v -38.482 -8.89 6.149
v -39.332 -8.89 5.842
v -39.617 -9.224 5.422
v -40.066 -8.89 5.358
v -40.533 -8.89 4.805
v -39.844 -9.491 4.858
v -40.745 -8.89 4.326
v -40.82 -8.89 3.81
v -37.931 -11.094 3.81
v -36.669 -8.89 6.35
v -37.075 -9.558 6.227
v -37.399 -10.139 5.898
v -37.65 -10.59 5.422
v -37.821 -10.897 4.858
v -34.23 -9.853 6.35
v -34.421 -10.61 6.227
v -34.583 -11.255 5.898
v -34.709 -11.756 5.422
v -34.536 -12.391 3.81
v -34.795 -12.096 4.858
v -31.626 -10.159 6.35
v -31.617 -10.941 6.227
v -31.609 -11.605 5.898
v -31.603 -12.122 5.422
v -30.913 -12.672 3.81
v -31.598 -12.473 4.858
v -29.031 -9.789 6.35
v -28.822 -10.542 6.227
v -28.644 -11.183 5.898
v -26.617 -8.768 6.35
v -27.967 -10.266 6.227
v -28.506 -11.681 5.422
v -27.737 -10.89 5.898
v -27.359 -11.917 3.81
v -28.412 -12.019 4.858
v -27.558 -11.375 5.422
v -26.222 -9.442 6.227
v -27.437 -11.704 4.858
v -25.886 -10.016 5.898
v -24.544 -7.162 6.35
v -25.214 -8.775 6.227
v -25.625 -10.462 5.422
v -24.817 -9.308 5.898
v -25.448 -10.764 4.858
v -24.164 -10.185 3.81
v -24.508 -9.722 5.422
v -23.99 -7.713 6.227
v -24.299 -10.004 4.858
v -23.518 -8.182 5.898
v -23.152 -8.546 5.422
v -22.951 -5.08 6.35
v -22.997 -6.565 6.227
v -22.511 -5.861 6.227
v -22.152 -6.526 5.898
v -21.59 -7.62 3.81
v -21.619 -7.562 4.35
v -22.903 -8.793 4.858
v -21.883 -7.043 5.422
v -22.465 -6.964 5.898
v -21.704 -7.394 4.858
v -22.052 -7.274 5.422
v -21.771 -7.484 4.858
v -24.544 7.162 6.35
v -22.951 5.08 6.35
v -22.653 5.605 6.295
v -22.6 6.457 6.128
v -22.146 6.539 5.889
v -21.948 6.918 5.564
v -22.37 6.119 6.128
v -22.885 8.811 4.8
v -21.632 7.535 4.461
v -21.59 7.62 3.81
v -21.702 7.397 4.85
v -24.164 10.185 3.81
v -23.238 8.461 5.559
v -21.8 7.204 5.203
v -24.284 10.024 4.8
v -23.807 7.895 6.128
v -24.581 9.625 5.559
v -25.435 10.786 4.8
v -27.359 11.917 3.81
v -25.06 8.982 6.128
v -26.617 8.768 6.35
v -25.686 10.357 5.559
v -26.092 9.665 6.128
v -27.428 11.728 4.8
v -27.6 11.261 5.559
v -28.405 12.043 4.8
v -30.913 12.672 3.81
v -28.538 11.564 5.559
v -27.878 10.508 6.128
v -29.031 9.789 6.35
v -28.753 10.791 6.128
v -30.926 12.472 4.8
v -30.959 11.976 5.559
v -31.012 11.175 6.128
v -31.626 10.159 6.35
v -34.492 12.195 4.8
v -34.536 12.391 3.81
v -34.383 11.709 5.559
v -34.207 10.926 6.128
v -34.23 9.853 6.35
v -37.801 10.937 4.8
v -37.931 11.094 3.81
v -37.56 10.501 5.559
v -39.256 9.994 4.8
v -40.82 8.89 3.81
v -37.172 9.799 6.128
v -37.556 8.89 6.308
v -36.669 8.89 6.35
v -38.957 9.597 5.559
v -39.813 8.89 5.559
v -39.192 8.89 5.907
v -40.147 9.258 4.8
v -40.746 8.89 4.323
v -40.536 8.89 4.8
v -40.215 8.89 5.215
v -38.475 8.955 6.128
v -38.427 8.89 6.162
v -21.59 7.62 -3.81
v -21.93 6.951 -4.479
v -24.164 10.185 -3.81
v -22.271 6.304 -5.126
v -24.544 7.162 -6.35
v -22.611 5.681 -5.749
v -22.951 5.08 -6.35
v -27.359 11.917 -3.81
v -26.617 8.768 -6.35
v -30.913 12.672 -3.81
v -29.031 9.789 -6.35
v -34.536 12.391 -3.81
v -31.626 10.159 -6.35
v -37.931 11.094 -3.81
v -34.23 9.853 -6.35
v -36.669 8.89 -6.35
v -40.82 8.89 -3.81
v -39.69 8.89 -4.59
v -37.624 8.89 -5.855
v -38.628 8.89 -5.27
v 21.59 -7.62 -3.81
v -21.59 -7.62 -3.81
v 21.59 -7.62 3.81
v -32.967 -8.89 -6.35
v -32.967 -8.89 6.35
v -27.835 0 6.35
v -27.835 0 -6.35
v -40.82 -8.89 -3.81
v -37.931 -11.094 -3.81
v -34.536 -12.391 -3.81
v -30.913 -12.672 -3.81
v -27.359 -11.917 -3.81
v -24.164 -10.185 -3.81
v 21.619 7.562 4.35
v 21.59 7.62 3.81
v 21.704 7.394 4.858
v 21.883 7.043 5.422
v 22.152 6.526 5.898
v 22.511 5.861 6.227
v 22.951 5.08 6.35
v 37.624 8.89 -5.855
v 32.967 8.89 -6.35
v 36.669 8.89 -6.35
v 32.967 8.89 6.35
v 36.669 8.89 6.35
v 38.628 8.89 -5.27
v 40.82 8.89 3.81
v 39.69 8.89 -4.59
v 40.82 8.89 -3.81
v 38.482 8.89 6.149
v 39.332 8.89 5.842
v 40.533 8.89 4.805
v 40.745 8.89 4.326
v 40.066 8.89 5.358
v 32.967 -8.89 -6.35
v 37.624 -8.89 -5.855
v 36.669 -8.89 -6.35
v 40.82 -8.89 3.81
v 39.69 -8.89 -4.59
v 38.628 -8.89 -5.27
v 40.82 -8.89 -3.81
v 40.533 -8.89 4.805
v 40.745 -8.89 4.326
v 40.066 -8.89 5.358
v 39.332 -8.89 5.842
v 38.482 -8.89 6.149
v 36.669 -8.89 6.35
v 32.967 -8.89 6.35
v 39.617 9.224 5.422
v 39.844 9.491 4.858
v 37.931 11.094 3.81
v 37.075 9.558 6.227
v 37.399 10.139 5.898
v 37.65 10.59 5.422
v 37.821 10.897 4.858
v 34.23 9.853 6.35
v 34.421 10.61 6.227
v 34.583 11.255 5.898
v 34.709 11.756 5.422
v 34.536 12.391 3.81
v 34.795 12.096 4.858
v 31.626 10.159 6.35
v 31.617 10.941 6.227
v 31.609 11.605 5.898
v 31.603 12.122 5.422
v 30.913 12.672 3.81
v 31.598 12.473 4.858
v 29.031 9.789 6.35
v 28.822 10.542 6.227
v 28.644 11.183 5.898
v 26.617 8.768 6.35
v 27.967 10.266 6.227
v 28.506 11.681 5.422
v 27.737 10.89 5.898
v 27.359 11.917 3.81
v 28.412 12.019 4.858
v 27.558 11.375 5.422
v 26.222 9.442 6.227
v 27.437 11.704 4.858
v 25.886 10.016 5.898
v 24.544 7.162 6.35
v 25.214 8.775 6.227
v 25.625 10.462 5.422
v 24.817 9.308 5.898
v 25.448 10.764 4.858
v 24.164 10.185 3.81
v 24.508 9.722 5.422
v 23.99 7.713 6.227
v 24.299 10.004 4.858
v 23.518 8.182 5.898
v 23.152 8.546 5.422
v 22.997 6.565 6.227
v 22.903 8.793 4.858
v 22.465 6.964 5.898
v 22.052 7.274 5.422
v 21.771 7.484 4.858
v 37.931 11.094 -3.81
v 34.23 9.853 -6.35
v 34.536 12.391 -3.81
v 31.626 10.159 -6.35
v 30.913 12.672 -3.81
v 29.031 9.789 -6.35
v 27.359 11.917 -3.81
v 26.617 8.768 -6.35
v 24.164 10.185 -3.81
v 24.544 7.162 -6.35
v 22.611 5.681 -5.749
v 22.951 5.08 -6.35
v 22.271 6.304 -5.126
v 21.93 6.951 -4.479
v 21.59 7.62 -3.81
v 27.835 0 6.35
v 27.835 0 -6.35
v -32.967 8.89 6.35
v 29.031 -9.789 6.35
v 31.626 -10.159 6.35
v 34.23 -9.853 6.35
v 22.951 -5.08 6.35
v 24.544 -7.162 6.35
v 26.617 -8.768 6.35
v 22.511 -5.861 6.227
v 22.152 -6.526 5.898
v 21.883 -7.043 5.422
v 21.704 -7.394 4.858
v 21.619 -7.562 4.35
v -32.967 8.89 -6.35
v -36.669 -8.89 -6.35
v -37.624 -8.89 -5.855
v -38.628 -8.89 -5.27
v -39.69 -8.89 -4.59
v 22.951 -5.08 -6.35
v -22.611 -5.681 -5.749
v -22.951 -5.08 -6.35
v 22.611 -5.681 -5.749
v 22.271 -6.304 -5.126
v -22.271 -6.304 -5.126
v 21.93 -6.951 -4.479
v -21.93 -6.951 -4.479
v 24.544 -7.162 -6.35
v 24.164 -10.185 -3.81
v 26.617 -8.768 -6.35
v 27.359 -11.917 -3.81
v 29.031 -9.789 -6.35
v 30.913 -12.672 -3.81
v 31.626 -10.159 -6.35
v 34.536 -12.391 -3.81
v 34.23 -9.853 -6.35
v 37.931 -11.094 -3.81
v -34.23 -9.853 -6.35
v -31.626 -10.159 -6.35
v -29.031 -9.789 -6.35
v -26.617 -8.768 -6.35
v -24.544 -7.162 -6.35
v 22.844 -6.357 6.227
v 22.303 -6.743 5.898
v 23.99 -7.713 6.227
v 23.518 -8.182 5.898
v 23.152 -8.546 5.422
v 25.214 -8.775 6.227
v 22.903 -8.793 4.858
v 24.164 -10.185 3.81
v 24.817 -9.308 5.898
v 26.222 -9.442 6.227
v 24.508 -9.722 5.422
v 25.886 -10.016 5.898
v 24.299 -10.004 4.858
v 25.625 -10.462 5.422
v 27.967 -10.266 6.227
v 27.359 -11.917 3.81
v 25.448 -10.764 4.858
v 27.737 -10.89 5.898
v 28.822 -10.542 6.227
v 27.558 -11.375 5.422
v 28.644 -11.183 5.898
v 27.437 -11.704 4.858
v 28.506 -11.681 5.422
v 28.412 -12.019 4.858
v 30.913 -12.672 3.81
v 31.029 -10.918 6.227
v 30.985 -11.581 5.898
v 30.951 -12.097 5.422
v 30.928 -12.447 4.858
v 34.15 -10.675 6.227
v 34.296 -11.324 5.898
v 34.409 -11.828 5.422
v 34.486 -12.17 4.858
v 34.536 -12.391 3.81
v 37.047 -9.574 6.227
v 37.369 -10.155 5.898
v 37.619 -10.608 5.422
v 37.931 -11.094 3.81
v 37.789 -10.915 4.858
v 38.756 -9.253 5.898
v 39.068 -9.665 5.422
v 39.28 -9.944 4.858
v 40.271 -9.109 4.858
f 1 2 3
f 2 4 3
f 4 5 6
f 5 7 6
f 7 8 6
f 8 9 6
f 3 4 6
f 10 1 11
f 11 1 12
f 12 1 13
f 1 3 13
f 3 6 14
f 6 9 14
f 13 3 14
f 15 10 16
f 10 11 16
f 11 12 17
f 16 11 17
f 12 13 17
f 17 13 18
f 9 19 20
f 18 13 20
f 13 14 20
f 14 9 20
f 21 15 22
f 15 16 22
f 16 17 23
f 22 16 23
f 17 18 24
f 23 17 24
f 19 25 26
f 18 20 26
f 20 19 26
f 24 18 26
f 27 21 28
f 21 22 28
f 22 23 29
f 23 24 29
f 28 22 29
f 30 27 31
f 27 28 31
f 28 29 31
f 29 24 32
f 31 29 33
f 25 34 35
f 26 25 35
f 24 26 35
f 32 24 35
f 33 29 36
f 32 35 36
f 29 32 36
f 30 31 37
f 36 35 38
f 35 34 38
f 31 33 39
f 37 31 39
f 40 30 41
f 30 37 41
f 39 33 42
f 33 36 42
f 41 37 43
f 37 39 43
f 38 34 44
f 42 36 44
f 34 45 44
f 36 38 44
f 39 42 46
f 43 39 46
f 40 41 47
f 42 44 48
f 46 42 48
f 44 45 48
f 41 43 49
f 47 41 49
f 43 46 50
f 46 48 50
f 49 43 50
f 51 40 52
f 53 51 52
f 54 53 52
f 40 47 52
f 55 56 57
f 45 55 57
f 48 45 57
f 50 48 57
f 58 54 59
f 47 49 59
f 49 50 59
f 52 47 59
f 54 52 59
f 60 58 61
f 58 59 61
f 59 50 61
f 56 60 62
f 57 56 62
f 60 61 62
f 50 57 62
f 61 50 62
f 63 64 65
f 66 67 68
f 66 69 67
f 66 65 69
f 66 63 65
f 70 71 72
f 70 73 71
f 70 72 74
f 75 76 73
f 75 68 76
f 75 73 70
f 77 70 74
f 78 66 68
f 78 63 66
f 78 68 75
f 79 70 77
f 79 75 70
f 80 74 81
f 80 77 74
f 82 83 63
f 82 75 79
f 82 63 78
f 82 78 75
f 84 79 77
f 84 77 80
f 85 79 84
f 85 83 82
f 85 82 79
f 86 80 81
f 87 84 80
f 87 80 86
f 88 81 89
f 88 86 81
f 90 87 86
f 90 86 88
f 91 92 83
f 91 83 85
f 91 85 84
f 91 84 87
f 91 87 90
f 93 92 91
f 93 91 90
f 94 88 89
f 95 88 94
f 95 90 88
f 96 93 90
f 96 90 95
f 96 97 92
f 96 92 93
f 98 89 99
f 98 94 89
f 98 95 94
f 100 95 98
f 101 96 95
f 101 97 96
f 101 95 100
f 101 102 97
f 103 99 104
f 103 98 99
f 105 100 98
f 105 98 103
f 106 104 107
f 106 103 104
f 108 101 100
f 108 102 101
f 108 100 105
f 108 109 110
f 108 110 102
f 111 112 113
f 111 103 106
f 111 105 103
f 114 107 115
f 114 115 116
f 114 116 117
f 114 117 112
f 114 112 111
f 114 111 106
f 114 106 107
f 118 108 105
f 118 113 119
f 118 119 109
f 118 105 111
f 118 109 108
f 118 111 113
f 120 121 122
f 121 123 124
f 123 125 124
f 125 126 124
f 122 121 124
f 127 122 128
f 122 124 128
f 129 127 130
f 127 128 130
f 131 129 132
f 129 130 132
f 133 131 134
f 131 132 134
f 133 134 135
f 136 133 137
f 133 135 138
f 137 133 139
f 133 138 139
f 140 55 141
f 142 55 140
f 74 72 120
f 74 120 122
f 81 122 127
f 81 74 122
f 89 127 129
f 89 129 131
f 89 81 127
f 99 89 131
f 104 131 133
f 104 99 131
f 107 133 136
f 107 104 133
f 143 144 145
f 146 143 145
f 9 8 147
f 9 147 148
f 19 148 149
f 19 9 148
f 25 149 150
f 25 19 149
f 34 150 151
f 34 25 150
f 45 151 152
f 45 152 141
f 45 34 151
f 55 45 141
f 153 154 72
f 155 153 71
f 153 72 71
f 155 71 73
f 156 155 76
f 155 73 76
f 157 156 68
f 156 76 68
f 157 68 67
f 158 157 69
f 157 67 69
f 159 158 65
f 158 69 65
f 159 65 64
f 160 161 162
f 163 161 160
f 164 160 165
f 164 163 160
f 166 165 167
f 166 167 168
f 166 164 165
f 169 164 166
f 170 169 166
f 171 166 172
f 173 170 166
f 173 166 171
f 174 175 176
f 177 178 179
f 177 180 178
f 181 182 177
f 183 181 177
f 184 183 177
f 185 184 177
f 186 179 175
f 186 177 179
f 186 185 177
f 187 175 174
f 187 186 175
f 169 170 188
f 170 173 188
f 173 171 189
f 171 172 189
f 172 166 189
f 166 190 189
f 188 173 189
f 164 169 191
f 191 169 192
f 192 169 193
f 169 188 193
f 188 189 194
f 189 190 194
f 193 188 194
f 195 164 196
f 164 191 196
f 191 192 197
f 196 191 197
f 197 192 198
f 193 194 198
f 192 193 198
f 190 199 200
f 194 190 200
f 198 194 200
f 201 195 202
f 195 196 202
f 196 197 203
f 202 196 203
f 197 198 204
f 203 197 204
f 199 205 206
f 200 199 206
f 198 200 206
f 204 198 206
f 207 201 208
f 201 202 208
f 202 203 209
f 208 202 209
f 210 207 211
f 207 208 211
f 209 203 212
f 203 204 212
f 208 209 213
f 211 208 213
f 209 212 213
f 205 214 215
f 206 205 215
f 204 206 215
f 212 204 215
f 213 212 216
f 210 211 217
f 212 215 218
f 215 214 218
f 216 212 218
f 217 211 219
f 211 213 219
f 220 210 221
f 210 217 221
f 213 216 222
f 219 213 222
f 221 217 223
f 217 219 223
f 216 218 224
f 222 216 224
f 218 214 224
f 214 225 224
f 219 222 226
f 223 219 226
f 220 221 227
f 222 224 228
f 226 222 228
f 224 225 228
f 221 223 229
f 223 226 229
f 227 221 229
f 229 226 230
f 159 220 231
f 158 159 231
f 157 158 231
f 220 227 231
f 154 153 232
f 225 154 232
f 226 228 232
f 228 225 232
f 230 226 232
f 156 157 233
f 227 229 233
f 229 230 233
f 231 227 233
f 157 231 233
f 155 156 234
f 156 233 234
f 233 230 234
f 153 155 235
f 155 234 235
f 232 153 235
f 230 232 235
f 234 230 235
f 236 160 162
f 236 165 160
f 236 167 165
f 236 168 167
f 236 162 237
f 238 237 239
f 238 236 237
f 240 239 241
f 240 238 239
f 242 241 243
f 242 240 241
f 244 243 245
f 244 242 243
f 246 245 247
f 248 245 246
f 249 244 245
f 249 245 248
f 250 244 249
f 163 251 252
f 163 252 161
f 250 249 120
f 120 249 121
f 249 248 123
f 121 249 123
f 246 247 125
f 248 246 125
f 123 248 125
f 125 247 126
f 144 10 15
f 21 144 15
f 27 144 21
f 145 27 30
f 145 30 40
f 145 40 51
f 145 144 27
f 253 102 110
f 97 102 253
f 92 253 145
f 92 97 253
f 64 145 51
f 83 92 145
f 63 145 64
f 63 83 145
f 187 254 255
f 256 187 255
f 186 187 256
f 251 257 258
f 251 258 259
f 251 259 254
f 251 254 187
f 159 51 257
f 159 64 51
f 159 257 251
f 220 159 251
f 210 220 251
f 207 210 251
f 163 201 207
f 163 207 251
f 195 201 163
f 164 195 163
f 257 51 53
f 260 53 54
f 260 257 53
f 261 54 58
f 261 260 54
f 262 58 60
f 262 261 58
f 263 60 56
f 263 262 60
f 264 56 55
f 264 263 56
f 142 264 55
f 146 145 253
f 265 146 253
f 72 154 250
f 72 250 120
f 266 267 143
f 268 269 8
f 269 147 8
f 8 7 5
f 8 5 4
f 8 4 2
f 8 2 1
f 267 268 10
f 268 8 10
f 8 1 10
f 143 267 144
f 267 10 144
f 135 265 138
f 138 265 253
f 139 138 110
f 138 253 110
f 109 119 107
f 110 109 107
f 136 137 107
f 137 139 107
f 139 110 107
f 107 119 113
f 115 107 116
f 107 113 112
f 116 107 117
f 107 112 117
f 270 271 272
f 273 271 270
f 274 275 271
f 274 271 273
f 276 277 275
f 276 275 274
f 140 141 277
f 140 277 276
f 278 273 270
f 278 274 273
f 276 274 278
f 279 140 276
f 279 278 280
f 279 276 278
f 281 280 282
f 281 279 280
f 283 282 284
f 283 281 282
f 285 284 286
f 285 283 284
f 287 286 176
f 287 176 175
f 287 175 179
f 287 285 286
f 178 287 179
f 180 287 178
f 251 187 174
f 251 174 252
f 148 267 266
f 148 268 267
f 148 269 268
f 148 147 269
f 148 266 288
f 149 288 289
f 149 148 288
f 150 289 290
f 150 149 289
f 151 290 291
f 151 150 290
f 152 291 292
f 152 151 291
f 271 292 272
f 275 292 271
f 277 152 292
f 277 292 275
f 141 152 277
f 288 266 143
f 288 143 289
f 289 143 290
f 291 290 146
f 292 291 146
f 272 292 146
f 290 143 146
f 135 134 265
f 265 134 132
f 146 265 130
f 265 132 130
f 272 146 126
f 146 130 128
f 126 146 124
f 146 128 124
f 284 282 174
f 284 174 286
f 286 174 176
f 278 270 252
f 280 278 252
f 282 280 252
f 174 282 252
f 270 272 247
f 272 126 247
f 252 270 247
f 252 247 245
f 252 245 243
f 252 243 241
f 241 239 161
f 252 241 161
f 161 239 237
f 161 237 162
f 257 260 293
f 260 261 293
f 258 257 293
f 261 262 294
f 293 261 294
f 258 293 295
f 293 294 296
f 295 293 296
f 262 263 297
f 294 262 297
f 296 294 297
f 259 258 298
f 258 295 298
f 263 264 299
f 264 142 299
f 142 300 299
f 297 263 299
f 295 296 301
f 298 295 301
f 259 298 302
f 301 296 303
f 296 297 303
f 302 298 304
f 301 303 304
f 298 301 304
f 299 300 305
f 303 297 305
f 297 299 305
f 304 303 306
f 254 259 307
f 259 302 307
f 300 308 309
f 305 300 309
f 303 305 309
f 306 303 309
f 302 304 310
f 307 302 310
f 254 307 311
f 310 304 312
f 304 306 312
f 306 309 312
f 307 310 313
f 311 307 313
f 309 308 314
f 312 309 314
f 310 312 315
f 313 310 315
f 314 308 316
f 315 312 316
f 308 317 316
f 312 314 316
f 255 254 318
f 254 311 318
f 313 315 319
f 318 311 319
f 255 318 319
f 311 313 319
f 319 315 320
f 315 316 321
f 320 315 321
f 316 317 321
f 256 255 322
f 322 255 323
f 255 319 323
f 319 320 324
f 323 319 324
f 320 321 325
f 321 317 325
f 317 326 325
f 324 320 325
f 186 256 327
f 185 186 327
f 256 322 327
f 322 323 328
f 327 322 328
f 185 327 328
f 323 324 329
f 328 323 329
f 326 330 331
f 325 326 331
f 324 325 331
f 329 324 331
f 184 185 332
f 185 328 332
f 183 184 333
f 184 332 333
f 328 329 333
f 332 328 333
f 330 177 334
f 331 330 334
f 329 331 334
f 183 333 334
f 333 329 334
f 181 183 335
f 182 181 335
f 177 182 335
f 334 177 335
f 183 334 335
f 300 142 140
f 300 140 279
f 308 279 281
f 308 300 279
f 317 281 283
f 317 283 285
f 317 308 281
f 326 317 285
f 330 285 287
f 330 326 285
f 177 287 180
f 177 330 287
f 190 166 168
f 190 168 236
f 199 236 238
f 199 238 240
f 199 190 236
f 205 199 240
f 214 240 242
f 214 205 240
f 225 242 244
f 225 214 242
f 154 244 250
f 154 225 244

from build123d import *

# Parameters (mm, degrees)
F1_DEPTH = 6.35
F3_DEPTH = 12.701
F6_R     = 2.54
F7_SIZE  = 2.54


with BuildPart() as f1:
    # F0 (on Top) → F1 (new body, symmetric)
    with BuildSketch(Plane.XY):
        with BuildLine():
            Line((21.59, 7.62), (-21.59, 7.62))
            ThreePointArc((-21.59, 7.62), (-44.45, 0), (-21.59, -7.62))
            Line((-21.59, -7.62), (21.59, -7.62))
            ThreePointArc((21.59, -7.62), (44.45, 0), (21.59, 7.62))
        make_face()
    extrude(amount=F1_DEPTH, both=True)

    # F4: F3 across plane


with BuildPart() as f3:
    # F2 (on face) → F3 (new body, through all)
    with BuildSketch(Plane.XY.offset(6.35)):
        Polygon((-43.232644, 8.89), (-48.365288, 0), (-43.232644, -8.89), (-32.967356, -8.89), (-27.834712, 0), (-32.967356, 8.89), align=None)
    extrude(amount=-F3_DEPTH)


with BuildPart() as f1_1:
    add(f1.part)
    add(f3.part.mirror(Plane.YZ), mode=Mode.SUBTRACT)

    # F5: cut F3
    add(f3.part, mode=Mode.SUBTRACT)

    # F6
    f6_edges = [f1_1.edges().sort_by_distance(p)[0] for p in [
        (0, -7.62, 6.35),
        (-30.913065, 12.672393, 6.35),
        (-30.913065, -12.672393, 6.35),
        (30.913065, -12.672393, 6.35),
        (30.913065, 12.672393, 6.35),
        (0, 7.62, 6.35),
    ]]
    fillet(f6_edges, radius=F6_R)

    # F7
    f7_edges = [f1_1.edges().sort_by_distance(p)[0] for p in [
        (-30.913065, 12.672393, -6.35),
        (-30.913065, -12.672393, -6.35),
        (0, -7.62, -6.35),
        (30.913065, -12.672393, -6.35),
        (30.913065, 12.672393, -6.35),
        (0, 7.62, -6.35),
    ]]
    chamfer(f7_edges, length=F7_SIZE)


solid = f1_1.part
